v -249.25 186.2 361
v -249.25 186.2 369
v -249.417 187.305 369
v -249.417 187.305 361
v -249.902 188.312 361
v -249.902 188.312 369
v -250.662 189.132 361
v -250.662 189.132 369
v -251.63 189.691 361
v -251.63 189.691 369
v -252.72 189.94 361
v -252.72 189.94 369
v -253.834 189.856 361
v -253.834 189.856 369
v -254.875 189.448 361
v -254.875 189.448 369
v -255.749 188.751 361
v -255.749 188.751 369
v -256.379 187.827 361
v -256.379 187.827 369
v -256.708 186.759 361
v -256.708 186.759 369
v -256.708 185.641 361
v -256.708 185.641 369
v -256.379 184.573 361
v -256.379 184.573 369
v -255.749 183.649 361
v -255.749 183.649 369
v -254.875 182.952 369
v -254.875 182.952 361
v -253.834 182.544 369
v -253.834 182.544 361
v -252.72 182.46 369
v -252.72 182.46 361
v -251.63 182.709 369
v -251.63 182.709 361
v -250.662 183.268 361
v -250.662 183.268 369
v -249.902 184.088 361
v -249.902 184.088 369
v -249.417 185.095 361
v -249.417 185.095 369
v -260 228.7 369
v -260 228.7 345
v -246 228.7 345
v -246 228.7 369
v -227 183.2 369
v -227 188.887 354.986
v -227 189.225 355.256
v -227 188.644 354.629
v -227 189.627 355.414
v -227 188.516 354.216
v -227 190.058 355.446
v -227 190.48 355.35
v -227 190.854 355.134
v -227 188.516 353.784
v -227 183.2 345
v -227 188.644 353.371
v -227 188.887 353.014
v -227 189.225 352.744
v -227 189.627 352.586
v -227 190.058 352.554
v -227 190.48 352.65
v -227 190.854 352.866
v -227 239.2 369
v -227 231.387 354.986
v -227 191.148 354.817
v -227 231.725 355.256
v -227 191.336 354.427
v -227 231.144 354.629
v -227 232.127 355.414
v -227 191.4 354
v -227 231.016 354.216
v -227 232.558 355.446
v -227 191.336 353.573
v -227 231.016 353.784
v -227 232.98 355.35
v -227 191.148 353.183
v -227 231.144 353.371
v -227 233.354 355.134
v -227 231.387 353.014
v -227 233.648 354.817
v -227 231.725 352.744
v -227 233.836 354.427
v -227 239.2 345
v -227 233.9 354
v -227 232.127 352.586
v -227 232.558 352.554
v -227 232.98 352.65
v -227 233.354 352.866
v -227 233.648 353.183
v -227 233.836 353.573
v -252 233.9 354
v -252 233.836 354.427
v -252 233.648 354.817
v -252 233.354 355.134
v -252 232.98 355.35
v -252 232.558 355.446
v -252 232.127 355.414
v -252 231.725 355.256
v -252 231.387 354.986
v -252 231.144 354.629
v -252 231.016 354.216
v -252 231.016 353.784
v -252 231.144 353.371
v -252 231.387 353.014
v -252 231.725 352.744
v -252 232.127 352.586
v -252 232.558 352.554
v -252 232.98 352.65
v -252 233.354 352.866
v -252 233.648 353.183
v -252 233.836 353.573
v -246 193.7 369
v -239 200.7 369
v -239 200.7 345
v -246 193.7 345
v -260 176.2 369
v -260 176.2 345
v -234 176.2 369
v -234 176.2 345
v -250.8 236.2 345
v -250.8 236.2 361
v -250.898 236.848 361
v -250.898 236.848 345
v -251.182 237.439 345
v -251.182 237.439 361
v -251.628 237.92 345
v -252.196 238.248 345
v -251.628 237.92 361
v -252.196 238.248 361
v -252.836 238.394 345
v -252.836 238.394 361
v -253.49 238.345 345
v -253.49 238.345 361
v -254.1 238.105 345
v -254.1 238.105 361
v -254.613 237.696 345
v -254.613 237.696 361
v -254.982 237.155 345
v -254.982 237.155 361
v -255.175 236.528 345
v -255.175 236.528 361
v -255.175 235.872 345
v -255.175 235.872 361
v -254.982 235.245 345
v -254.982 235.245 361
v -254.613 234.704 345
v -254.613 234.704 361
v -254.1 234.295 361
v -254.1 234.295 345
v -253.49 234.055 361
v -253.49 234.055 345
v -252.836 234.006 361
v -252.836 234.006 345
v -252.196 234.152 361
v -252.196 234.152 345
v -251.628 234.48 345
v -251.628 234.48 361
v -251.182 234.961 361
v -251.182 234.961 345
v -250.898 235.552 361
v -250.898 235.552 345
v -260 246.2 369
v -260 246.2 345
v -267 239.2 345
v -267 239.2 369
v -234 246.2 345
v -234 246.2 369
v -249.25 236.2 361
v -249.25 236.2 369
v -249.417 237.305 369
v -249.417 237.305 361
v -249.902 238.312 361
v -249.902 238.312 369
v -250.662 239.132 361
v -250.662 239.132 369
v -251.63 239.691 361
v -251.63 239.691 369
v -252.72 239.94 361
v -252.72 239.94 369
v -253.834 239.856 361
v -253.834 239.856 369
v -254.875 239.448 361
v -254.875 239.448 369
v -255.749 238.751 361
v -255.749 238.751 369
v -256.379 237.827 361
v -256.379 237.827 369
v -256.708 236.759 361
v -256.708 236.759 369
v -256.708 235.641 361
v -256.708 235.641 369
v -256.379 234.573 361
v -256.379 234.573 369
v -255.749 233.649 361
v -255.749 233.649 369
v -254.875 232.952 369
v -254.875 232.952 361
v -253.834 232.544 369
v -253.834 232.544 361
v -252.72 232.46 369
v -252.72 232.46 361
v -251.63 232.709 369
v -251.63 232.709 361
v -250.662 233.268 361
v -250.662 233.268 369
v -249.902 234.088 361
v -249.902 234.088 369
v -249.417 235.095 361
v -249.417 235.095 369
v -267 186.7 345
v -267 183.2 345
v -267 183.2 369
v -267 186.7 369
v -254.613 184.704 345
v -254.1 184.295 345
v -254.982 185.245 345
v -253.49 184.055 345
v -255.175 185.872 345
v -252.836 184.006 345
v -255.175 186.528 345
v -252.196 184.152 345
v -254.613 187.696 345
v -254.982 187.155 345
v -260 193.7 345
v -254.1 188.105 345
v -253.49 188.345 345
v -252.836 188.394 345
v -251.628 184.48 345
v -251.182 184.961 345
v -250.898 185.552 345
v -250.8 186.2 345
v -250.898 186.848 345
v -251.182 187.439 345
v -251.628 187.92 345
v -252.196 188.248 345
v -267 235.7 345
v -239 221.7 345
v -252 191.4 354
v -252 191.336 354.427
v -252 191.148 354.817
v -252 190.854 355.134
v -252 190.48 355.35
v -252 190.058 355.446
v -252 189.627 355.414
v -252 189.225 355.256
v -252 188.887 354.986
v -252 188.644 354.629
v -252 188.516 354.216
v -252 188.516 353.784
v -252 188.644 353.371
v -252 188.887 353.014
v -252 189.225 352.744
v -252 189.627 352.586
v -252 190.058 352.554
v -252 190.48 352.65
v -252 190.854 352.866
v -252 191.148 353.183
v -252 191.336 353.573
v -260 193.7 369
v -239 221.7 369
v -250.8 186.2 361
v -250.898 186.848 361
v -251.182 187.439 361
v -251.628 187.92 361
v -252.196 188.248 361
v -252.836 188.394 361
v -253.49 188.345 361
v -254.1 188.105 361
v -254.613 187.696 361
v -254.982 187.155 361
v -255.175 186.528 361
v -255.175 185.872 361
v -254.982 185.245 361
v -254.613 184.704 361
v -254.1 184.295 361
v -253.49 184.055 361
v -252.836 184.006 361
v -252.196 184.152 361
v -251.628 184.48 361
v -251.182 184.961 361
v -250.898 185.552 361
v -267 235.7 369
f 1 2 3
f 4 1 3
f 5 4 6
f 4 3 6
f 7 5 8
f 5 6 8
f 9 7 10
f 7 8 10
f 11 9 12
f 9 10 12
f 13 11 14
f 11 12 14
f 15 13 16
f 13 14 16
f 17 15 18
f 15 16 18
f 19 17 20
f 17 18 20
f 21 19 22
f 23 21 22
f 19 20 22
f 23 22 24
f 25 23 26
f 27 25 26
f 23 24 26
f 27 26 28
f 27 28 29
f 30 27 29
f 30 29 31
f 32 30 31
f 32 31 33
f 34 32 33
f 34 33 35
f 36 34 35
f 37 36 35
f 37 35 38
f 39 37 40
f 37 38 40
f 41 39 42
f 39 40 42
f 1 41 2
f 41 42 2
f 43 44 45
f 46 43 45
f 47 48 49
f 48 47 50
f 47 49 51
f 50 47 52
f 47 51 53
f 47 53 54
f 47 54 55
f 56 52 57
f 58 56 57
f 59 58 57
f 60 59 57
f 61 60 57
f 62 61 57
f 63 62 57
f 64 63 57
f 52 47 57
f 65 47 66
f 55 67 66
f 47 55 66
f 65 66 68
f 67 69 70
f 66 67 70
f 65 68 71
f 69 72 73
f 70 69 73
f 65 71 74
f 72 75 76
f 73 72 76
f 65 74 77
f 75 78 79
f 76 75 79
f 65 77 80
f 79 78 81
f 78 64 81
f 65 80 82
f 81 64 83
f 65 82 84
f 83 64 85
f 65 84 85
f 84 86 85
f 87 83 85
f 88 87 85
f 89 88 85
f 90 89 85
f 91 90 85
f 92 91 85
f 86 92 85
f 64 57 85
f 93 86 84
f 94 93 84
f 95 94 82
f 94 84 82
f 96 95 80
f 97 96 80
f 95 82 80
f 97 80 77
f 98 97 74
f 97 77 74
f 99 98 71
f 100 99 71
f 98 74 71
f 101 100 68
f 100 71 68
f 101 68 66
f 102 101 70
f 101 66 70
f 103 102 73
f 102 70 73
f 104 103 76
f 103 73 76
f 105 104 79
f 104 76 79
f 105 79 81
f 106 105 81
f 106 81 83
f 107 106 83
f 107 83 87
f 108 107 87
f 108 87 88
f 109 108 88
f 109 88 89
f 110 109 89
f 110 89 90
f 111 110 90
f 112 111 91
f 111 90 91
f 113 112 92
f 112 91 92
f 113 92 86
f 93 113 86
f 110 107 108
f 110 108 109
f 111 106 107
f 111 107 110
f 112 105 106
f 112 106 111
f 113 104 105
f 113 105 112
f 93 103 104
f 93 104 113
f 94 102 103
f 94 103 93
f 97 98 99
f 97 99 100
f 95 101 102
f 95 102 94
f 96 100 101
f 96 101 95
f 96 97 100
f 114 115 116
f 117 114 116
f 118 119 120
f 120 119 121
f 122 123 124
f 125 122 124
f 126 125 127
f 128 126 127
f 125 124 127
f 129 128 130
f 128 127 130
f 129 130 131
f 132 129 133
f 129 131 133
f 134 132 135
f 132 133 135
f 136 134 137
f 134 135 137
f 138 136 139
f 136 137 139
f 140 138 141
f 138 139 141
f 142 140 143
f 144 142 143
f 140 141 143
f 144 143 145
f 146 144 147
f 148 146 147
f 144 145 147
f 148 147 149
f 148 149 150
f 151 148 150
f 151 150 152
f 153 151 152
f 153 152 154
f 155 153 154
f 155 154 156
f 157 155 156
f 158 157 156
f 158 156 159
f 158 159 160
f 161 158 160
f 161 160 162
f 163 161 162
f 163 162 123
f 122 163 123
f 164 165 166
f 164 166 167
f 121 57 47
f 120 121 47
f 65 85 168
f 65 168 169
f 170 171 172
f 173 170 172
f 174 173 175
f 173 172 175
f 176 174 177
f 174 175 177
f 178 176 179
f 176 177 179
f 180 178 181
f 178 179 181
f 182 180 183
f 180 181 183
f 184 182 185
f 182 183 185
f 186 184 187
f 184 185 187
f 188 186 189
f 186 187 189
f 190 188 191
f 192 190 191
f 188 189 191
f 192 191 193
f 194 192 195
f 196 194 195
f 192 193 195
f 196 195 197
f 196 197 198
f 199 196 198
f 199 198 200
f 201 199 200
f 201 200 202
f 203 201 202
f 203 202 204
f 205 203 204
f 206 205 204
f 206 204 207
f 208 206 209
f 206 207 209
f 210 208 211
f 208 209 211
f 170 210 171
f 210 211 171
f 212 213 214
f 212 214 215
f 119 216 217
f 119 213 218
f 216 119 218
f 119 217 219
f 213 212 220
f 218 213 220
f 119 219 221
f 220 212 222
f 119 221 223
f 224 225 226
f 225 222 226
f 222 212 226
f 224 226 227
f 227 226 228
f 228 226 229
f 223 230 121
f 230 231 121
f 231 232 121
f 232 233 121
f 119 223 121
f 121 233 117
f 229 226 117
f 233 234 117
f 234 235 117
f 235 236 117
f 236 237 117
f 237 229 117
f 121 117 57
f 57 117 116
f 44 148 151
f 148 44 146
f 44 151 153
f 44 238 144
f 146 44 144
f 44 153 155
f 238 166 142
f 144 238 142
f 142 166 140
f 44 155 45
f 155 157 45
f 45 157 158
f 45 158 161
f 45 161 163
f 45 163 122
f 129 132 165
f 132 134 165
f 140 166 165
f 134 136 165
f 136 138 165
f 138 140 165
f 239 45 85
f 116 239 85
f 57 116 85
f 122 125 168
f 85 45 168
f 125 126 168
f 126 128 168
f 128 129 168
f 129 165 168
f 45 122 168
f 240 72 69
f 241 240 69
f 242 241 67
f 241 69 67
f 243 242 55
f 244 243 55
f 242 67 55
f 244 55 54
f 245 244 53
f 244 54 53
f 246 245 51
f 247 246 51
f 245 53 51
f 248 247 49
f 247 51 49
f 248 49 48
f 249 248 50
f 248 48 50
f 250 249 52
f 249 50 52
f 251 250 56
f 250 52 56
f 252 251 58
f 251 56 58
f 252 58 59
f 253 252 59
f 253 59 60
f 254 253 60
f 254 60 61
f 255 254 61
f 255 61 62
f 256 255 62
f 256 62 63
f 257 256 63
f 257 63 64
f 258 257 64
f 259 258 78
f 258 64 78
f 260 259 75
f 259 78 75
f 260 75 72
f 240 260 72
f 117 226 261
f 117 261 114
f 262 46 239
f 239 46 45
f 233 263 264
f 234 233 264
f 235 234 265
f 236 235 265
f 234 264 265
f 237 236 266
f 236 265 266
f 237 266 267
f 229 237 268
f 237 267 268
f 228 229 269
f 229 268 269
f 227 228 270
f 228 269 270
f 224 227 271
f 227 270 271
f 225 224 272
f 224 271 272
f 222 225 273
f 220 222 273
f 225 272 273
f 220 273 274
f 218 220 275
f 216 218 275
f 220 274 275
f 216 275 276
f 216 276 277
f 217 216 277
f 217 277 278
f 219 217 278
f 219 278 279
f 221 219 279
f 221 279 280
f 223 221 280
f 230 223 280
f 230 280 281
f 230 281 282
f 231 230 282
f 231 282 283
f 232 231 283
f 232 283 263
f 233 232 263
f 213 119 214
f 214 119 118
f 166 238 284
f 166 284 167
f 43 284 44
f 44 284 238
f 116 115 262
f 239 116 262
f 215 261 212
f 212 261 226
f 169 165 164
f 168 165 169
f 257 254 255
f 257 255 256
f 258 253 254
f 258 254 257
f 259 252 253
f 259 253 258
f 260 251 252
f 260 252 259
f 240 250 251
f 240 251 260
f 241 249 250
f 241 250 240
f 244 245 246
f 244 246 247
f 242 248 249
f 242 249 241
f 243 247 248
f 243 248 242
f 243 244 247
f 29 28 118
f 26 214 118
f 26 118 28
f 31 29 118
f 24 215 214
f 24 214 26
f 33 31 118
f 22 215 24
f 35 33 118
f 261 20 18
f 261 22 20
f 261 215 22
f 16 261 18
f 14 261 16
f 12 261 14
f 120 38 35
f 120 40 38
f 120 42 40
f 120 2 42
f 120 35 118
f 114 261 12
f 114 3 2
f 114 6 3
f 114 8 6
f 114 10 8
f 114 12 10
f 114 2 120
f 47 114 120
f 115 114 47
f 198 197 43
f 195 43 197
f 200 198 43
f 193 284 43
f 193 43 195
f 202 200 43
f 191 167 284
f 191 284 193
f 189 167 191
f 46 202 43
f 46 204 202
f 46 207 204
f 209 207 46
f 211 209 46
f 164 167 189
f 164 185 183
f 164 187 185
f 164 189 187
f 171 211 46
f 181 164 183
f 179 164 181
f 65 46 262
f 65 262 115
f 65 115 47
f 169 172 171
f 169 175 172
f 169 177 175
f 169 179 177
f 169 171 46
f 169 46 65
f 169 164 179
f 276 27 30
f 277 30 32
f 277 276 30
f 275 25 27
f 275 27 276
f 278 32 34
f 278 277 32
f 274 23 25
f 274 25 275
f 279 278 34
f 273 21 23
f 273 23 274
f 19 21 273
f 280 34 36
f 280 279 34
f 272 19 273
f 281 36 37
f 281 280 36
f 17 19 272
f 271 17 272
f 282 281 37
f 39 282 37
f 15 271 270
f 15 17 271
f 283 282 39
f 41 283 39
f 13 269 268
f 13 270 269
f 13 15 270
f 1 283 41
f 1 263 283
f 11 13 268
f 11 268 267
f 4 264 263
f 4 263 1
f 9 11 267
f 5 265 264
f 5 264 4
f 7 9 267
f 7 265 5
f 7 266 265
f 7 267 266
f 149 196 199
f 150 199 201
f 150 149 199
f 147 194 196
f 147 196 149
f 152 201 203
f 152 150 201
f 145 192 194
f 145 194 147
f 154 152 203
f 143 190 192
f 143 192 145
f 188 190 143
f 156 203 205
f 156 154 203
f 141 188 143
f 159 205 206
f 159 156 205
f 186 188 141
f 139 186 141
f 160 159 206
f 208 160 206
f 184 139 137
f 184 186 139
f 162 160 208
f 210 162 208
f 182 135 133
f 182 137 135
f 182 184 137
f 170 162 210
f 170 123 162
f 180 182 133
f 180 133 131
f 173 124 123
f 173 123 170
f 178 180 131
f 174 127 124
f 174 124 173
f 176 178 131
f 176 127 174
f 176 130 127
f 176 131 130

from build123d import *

# Parameters (mm, degrees)
BOX003_W        = 40
BOX003_H        = 70
BOX003_DEPTH    = 24
SKETCH012_R     = 2.2
SKETCH012_W     = 28
SKETCH012_H     = 35
POCKET012_DEPTH = 37
CHAMFER004_SIZE = 7
SKETCH013_R     = 3.75
POCKET013_DEPTH = 8
SKETCH014_R     = 1.45
POCKET014_DEPTH = 25


with BuildPart() as part:
    # Box003 → Box003 (new body)
    with BuildSketch(Plane(origin=(-267, 176.2, 345), x_dir=(1, 0, 0), z_dir=(0, 0, 1))):
        with Locations((20, 35)):
            Rectangle(BOX003_W, BOX003_H)
    extrude(amount=BOX003_DEPTH)

    # Sketch012 → Pocket012 (cut)
    with BuildSketch(Plane(origin=(-267, 176.2, 369), x_dir=(1, 0, 0), z_dir=(0, 0, 1))):
        with Locations((14, 60)):
            Circle(SKETCH012_R)
        with Locations((14, 10)):
            Circle(SKETCH012_R)
        with Locations((14, 35)):
            Rectangle(SKETCH012_W, SKETCH012_H)
    extrude(amount=-POCKET012_DEPTH, mode=Mode.SUBTRACT)

    # Chamfer004
    chamfer004_edges = [part.edges().sort_by_distance(p)[0] for p in [
        (-227, 176.2, 357),
        (-267, 176.2, 357),
        (-267, 193.7, 357),
        (-239, 193.7, 357),
        (-239, 228.7, 357),
        (-267, 228.7, 357),
        (-267, 246.2, 357),
        (-227, 246.2, 357),
    ]]
    chamfer(chamfer004_edges, length=CHAMFER004_SIZE)

    # Sketch013 → Pocket013 (cut)
    with BuildSketch(Plane(origin=(-267, 176.2, 369), x_dir=(1, 0, 0), z_dir=(0, 0, 1))):
        with Locations((14, 60)):
            Circle(SKETCH013_R)
        with Locations((14, 10)):
            Circle(SKETCH013_R)
    extrude(amount=-POCKET013_DEPTH, mode=Mode.SUBTRACT)

    # Sketch014 → Pocket014 (cut)
    with BuildSketch(Plane(origin=(-227, 176.2, 345), x_dir=(0, 1, 0), z_dir=(1, 0, 0))):
        with Locations((13.75, 9)):
            Circle(SKETCH014_R)
        with Locations((56.25, 9)):
            Circle(SKETCH014_R)
    extrude(amount=-POCKET014_DEPTH, mode=Mode.SUBTRACT)


solid = part.part
